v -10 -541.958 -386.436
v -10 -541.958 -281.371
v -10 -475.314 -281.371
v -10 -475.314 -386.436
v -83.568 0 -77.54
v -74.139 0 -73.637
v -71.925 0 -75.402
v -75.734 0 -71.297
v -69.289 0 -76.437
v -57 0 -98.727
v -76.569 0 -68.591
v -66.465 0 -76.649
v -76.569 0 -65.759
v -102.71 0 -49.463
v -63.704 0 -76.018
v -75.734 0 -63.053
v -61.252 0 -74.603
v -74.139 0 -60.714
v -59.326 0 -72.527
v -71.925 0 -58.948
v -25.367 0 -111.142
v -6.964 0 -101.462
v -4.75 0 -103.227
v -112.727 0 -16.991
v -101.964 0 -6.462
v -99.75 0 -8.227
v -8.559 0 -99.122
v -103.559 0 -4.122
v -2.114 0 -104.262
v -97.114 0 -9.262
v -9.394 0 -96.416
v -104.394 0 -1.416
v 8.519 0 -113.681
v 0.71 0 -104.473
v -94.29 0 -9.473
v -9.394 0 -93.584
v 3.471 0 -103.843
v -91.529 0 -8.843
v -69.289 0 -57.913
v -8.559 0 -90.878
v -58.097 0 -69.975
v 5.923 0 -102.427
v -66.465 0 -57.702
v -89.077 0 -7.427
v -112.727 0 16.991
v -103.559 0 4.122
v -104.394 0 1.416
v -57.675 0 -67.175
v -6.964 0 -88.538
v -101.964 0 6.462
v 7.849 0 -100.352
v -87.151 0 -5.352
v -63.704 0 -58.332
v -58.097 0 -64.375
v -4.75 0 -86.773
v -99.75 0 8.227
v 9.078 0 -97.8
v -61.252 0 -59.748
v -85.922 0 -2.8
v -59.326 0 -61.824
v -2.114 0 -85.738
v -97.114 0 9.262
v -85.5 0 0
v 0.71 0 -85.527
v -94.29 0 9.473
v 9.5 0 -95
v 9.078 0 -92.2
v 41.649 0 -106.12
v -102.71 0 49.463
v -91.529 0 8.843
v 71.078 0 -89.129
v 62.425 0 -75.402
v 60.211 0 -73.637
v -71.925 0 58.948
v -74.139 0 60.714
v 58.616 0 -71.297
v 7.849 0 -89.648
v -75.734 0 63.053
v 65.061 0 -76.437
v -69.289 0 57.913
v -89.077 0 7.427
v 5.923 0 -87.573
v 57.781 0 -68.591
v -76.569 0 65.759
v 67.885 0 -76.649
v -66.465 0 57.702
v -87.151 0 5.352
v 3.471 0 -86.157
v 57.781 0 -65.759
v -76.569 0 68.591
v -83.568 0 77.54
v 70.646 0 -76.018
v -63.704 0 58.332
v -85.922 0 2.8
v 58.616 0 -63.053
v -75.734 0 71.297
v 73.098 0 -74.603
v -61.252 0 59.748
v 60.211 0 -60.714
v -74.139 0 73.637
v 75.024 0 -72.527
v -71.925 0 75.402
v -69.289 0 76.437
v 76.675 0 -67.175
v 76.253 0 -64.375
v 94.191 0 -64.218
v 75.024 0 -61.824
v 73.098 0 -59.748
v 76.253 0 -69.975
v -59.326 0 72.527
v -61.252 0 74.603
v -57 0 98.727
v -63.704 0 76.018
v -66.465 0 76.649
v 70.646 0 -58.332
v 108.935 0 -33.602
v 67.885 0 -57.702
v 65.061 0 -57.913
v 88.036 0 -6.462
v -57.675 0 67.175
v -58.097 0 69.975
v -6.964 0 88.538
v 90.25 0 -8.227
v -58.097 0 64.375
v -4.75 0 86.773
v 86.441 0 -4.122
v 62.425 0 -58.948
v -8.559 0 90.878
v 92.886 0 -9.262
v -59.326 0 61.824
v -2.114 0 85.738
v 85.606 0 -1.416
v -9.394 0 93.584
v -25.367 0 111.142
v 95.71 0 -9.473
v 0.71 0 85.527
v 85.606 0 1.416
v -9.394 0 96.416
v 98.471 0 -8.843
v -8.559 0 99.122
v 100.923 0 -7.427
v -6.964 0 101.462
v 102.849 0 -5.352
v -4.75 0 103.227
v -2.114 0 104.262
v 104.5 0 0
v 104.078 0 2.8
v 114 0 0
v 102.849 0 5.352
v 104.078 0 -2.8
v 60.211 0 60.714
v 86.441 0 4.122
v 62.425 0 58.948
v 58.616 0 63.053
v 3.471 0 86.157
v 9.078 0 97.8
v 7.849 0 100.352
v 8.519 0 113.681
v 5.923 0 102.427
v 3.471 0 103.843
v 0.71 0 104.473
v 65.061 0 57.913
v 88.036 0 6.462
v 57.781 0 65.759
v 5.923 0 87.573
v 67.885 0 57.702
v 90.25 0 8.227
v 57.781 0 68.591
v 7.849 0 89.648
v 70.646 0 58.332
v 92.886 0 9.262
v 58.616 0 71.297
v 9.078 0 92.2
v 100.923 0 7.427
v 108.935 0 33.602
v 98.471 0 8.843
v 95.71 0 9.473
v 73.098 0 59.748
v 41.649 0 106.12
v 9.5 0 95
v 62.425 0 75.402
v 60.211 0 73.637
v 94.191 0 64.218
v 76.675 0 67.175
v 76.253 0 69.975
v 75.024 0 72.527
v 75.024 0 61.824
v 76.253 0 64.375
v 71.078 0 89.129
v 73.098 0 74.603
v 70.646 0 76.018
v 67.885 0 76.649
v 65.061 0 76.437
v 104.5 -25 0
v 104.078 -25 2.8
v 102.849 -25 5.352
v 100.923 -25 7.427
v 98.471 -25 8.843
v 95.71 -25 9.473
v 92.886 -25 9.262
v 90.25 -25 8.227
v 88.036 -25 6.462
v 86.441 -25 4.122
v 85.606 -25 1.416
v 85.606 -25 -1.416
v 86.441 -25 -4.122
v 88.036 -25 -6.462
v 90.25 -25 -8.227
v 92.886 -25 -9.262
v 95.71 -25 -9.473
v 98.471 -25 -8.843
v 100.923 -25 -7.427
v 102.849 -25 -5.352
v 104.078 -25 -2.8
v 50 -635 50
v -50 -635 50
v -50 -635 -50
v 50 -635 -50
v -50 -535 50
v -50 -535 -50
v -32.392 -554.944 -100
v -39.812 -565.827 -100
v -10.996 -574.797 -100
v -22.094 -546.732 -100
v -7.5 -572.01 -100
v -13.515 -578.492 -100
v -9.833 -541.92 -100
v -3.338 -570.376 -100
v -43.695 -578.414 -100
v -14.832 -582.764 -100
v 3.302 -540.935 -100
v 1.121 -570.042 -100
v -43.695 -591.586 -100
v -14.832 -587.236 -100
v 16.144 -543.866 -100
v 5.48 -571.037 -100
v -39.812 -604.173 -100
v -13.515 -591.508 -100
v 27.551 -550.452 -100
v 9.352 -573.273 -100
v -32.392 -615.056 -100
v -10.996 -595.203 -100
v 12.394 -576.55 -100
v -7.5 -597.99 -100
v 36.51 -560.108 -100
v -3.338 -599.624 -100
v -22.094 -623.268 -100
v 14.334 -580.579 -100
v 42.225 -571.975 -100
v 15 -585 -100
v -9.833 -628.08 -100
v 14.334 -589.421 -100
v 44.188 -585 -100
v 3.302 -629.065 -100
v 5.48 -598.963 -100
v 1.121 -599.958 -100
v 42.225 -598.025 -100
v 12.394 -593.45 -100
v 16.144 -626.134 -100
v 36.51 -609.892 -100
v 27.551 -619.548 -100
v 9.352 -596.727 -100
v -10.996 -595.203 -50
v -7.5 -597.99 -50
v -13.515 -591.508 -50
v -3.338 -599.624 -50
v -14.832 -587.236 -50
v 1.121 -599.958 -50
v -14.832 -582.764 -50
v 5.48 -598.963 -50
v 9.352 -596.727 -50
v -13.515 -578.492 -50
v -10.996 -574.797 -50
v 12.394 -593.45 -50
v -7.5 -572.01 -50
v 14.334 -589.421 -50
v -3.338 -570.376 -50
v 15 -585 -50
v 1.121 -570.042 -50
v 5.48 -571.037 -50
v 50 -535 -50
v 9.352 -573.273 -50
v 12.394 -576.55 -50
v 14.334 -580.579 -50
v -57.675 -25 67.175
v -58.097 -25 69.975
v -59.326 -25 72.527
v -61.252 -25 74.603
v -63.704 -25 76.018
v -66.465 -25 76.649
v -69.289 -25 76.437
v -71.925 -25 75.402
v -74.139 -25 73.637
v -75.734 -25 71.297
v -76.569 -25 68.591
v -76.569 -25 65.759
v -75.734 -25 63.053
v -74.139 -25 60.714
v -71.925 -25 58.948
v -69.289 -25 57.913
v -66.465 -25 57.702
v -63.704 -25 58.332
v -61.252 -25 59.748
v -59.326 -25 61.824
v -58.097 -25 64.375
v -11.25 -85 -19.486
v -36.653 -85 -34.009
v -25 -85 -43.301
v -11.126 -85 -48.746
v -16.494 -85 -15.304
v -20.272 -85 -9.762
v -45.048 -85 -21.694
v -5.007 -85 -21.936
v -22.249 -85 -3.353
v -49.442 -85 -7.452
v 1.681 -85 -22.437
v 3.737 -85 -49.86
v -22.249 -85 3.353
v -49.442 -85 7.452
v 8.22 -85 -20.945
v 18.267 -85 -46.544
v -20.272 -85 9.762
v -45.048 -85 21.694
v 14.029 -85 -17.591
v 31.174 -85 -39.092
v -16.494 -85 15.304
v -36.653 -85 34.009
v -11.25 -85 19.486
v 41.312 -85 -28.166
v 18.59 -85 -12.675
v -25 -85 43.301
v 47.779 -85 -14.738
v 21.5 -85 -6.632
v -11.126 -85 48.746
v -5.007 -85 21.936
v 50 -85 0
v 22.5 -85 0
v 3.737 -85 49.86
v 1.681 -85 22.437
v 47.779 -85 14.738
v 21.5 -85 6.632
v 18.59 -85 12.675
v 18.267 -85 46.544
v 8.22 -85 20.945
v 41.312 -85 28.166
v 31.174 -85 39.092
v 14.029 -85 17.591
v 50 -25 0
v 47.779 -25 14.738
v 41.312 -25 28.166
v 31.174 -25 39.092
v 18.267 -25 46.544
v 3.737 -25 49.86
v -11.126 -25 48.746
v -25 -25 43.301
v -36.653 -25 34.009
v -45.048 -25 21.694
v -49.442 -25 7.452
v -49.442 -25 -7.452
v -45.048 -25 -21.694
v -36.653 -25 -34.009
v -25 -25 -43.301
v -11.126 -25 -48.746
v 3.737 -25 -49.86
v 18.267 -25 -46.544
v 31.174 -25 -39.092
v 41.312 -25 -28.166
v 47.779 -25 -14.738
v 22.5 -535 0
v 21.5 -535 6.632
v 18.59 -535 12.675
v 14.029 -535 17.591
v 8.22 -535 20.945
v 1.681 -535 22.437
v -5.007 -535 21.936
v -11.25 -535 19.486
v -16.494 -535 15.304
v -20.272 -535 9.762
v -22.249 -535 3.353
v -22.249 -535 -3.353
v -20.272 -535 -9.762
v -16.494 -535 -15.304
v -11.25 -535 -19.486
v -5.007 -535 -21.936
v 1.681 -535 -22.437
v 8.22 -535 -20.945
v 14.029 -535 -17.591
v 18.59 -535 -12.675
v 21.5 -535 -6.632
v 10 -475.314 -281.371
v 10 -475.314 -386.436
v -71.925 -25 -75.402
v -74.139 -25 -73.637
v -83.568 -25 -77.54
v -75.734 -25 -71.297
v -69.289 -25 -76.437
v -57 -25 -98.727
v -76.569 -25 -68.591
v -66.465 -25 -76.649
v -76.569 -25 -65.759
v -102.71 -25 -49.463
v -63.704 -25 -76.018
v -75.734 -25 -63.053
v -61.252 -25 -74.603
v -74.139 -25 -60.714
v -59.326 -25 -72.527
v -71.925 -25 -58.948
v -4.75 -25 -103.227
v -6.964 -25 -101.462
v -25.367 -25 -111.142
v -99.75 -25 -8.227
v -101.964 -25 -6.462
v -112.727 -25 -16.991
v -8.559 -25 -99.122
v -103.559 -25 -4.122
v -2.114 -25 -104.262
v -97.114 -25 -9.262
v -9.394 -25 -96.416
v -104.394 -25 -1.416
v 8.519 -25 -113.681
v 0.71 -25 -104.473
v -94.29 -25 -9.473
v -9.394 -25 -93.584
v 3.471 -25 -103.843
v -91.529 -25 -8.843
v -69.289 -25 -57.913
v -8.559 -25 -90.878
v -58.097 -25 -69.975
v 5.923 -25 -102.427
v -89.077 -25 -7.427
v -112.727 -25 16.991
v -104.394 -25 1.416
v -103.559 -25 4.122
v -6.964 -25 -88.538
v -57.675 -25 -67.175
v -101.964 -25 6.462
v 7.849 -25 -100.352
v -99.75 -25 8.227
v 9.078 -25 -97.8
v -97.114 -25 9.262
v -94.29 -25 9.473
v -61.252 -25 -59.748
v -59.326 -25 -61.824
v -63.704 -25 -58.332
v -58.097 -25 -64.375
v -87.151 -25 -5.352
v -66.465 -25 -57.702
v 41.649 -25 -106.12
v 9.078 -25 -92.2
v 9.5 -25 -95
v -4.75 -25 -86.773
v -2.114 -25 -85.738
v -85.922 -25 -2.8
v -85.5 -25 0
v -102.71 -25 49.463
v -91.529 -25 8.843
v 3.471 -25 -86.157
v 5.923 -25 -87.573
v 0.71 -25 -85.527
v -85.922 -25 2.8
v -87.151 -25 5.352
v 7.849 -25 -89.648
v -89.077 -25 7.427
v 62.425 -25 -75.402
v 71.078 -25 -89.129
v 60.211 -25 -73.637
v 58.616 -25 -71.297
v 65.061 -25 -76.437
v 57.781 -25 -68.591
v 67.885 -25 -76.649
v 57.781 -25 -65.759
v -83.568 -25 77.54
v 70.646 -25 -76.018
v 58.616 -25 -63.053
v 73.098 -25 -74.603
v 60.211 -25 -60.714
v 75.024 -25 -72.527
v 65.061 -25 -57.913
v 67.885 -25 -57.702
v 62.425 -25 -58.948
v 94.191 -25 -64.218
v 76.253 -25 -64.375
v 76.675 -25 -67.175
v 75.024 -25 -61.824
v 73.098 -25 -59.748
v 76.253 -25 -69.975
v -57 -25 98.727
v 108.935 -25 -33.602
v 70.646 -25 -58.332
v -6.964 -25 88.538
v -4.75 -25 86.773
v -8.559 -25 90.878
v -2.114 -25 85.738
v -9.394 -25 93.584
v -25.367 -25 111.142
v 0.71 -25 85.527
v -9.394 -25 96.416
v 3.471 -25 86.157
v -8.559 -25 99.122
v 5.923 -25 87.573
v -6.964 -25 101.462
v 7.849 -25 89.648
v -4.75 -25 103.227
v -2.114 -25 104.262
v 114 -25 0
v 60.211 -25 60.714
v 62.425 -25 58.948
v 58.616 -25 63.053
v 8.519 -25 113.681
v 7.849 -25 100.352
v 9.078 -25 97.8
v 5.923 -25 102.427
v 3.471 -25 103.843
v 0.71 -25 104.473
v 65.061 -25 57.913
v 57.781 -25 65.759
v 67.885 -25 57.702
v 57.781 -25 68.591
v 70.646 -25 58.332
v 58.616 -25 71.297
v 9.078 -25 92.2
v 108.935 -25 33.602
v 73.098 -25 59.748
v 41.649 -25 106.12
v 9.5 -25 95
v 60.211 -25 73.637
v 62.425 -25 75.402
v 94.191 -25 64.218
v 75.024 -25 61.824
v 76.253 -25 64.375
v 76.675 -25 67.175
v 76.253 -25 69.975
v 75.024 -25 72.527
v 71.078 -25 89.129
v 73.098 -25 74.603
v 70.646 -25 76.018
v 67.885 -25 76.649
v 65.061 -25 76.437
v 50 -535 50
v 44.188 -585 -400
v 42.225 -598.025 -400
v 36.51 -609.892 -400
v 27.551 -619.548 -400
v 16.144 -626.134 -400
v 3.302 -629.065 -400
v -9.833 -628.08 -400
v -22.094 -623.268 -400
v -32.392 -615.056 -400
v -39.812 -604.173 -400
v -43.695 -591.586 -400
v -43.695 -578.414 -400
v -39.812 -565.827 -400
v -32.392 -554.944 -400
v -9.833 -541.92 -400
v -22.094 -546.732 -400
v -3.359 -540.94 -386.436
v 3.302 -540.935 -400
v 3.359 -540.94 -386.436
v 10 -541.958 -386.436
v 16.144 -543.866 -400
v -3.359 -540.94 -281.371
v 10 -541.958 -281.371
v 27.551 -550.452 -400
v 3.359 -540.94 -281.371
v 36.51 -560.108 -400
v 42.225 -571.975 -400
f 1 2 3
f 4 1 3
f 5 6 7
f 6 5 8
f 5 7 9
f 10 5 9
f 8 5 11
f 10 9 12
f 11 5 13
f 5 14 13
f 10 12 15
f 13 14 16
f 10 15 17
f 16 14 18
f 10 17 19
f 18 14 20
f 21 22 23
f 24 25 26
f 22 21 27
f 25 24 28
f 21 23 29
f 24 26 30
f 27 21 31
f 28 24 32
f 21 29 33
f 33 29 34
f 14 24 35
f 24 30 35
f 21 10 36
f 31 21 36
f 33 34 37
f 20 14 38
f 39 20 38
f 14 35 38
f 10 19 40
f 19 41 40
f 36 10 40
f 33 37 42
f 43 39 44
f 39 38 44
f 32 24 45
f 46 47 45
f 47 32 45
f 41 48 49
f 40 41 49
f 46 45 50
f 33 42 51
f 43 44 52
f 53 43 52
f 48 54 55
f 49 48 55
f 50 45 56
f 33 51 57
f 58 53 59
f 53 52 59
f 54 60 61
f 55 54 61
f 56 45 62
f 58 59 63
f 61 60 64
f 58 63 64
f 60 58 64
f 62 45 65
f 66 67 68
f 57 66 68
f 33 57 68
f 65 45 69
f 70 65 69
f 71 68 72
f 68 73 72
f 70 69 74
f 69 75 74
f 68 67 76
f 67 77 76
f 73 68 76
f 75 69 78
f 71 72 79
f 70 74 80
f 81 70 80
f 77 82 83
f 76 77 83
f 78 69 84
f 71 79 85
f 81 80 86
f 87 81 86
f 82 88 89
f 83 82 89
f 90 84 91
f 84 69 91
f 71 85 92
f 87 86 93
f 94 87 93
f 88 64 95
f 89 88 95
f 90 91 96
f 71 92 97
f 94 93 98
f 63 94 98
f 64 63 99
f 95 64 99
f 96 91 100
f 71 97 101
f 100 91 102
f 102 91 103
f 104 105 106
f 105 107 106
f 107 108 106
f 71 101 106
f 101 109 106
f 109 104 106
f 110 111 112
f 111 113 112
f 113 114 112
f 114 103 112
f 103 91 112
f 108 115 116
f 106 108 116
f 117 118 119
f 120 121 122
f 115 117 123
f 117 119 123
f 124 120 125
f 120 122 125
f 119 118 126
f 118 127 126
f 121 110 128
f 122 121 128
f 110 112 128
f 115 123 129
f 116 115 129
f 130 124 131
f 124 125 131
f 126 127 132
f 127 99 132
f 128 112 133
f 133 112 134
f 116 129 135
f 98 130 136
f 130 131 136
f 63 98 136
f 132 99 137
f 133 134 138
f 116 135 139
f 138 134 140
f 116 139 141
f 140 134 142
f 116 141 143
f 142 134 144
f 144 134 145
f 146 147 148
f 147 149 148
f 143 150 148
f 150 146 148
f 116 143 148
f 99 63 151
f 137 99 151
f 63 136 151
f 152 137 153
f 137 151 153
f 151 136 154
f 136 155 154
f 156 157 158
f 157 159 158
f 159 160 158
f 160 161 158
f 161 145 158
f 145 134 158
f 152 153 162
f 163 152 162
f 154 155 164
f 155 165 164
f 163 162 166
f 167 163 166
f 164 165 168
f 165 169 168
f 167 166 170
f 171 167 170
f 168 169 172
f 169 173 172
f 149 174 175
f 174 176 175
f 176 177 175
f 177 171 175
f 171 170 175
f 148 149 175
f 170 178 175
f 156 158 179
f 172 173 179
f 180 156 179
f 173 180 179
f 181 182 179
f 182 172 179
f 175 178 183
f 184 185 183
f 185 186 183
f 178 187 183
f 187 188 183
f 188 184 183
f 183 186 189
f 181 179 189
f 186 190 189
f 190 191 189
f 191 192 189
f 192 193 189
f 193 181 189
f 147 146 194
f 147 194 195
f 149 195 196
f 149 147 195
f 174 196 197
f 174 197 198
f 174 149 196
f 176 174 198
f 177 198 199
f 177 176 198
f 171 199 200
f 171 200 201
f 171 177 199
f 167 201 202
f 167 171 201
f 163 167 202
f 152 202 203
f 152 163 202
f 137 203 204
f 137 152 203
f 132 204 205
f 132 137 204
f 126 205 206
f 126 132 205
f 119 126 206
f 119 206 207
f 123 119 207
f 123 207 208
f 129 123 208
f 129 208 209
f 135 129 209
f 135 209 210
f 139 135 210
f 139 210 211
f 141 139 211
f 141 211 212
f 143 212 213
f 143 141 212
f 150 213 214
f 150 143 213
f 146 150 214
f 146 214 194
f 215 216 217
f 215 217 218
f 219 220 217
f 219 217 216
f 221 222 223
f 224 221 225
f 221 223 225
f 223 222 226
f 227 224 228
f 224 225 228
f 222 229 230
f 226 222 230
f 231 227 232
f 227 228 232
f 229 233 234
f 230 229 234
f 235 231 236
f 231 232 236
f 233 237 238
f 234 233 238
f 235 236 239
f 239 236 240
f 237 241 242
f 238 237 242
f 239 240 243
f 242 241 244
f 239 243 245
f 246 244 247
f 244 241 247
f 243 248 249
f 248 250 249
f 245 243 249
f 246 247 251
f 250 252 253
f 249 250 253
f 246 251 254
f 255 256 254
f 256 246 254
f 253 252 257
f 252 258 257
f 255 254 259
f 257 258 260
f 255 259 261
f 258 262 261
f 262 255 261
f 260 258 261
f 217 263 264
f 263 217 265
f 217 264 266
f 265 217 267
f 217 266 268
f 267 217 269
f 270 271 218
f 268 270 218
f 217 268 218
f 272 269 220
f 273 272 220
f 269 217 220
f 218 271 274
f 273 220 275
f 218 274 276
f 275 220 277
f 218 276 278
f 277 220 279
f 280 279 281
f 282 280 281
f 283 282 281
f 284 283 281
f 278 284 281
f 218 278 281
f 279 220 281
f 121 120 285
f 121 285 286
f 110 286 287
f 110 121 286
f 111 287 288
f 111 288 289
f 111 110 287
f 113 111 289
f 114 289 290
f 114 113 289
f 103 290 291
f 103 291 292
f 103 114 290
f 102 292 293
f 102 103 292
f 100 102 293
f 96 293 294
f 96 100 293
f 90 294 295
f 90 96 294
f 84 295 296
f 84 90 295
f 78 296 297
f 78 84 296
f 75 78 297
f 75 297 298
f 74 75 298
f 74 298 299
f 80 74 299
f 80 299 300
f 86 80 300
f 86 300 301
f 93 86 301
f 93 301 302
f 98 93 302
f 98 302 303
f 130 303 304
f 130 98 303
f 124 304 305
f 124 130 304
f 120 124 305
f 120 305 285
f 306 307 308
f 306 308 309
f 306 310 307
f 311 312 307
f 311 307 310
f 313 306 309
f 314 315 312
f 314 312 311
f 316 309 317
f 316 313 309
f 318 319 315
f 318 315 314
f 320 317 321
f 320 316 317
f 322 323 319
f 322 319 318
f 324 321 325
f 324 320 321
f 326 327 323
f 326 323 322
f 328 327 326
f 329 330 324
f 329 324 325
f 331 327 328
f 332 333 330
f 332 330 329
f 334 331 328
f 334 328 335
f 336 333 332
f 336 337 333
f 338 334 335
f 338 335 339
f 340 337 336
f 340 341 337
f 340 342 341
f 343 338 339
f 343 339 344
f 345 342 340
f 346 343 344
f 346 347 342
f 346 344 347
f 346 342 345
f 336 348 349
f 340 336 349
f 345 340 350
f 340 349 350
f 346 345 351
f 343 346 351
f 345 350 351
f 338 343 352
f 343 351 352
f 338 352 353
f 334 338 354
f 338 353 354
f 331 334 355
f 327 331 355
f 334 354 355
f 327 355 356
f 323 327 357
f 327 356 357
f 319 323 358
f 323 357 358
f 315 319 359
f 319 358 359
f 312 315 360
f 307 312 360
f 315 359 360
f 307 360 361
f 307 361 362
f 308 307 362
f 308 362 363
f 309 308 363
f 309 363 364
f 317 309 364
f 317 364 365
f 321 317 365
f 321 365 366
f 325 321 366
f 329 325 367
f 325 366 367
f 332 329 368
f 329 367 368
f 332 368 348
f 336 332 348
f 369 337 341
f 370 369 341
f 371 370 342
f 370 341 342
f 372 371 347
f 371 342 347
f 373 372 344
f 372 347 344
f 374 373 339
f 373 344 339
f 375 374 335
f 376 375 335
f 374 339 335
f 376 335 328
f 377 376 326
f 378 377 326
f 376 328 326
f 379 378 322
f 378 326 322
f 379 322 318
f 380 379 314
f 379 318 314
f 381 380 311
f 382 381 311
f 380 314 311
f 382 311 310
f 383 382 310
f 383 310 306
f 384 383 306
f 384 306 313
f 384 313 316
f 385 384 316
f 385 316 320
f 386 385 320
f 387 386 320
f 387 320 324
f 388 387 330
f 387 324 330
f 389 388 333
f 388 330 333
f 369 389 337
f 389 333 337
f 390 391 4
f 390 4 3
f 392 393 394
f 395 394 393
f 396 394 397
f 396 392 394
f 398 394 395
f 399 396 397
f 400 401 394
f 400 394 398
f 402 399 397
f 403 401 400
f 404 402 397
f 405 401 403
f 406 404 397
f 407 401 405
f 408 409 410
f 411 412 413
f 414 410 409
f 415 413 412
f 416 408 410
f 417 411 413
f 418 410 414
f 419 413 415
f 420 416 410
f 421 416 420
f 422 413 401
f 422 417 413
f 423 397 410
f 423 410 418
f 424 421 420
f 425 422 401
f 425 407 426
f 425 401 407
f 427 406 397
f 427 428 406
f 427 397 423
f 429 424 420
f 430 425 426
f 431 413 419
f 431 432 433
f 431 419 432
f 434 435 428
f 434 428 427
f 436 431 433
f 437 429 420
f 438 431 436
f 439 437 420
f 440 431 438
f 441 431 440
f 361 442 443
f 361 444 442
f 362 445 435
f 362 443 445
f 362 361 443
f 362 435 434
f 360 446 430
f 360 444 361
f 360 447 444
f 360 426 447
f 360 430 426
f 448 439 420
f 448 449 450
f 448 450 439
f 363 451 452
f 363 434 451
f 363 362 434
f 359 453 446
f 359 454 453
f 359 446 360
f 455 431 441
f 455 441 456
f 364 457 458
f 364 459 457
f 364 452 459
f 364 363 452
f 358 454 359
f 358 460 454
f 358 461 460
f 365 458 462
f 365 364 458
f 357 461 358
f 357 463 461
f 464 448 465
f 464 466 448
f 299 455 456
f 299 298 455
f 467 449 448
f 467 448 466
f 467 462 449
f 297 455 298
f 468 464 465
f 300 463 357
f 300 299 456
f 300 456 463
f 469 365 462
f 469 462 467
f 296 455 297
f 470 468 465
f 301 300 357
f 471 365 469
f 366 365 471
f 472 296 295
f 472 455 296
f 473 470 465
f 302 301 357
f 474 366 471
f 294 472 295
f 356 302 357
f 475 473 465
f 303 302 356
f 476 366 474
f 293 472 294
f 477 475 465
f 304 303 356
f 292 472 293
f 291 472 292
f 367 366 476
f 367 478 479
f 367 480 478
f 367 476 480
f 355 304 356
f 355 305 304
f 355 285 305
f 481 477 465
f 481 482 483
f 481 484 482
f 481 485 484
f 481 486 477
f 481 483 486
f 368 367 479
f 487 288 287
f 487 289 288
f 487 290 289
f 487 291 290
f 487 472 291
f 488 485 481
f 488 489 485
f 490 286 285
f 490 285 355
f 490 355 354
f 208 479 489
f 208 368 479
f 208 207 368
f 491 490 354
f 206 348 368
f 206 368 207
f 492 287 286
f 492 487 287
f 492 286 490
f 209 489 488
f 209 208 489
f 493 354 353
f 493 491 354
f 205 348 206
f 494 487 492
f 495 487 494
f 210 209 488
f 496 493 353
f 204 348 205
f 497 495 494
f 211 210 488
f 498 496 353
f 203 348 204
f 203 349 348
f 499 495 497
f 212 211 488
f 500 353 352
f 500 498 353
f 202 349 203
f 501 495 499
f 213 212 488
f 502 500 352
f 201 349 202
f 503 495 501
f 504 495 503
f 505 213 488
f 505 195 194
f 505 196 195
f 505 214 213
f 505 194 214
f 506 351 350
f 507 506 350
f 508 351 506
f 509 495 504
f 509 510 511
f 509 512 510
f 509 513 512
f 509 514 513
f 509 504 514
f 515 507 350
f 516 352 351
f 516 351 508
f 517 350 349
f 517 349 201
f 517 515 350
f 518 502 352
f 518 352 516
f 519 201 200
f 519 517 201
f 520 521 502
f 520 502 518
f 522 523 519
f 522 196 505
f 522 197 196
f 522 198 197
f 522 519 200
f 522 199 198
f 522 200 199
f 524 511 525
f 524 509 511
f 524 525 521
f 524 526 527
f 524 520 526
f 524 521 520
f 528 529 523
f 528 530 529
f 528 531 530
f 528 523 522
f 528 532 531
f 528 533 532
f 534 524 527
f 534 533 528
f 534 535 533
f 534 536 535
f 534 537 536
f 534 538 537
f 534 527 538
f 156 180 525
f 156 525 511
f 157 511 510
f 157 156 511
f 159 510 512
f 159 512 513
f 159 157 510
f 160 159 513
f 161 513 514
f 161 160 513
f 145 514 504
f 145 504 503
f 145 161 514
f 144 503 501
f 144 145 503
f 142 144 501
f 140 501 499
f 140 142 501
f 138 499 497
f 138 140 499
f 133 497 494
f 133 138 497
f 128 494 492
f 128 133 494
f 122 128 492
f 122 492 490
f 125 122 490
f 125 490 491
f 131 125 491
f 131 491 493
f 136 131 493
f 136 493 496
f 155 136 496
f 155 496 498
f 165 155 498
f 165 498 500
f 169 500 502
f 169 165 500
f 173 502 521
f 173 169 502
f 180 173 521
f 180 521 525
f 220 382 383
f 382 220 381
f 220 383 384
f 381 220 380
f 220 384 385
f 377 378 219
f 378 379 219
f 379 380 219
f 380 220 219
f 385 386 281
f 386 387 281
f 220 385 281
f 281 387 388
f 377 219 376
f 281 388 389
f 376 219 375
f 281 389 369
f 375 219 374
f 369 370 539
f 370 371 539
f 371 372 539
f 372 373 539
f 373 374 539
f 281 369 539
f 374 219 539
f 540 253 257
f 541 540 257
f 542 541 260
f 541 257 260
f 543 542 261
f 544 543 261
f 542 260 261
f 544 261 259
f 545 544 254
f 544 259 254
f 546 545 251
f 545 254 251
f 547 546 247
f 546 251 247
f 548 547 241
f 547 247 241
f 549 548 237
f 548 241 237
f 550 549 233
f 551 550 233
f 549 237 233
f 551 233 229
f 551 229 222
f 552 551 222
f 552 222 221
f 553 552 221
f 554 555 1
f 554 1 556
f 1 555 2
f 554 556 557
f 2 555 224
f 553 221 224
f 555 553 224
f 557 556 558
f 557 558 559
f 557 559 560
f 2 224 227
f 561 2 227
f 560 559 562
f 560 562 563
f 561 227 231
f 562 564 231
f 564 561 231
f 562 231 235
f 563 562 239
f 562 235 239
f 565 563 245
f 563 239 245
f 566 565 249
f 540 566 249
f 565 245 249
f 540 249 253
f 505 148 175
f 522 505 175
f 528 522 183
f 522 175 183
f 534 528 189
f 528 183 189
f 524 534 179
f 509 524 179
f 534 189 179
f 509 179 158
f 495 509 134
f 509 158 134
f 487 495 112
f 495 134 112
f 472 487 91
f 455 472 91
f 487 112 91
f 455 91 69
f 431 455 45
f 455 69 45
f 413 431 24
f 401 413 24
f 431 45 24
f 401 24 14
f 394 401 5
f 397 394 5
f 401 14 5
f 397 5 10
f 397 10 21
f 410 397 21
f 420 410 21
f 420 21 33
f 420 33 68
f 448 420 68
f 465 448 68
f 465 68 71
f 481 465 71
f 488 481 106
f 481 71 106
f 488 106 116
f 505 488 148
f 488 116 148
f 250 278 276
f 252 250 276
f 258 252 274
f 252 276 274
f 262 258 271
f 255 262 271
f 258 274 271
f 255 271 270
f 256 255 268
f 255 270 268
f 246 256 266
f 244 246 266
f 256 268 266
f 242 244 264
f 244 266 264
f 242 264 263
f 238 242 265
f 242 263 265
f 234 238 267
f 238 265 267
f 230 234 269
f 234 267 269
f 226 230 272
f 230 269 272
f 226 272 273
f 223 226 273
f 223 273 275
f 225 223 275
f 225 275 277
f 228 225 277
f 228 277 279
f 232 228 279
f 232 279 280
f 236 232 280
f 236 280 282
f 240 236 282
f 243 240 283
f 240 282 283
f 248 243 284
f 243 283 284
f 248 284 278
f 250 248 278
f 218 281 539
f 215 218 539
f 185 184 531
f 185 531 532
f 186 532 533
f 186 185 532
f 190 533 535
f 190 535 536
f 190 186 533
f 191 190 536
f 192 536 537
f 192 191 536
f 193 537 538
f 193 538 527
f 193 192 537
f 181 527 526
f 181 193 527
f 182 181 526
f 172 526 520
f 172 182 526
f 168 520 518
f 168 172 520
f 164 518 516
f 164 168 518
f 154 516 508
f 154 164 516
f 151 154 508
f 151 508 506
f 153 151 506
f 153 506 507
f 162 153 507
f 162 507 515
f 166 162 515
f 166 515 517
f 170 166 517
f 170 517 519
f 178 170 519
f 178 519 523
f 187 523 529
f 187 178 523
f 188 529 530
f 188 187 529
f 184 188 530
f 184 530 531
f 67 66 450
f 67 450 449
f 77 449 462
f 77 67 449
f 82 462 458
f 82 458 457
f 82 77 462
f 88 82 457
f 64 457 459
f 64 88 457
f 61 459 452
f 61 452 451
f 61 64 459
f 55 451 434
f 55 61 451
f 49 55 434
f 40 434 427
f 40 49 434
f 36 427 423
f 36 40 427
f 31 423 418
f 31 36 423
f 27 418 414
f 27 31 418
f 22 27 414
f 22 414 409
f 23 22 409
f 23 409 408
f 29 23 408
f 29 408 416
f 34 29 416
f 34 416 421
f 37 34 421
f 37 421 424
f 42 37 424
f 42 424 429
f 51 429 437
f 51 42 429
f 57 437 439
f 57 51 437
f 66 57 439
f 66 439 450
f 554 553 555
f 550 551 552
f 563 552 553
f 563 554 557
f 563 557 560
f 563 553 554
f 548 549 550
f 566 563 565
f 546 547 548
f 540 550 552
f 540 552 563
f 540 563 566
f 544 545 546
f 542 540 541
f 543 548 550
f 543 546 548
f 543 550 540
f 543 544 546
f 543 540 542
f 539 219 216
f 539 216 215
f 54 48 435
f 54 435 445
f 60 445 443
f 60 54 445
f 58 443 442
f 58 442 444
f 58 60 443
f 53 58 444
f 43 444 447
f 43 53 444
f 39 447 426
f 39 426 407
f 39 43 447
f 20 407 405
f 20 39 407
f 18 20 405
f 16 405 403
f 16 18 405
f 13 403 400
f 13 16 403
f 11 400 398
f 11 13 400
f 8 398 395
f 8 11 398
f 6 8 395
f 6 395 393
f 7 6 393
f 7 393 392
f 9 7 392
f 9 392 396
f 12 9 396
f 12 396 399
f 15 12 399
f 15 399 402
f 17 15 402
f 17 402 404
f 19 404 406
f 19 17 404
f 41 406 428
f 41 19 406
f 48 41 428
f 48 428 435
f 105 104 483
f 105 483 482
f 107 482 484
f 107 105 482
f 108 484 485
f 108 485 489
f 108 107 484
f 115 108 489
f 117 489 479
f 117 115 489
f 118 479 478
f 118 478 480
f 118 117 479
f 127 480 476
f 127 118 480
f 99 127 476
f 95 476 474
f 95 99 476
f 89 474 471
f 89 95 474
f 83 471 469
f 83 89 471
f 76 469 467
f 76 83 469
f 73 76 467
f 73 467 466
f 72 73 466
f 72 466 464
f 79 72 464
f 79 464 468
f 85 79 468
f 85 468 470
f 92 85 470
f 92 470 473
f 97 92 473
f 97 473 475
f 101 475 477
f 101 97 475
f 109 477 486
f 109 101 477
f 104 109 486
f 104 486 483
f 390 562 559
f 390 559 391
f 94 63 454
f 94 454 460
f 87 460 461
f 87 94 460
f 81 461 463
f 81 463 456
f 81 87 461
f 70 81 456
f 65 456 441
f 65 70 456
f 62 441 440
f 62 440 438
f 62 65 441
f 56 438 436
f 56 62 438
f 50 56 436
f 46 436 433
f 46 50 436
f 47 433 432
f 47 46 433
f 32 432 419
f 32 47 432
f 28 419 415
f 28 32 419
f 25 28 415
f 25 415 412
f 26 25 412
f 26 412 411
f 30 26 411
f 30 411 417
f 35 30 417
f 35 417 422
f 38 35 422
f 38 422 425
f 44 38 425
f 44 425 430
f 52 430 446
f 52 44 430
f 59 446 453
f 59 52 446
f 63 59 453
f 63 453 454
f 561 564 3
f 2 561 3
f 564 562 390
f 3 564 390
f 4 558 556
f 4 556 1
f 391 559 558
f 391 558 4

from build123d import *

# Parameters (mm, degrees)
F0_R      = 114
F0_R_2    = 9.5
F1_DEPTH  = 25
F2_R      = 50
F3_DEPTH  = 60
F4_R      = 22.5
F5_DEPTH  = 450
F6_W      = 100
F6_H      = 100
F7_DEPTH  = 100
F8_R      = 15
F9_DEPTH  = 50
F10_R     = 44.188125
F11_DEPTH = 300
F12_W     = 74.58368
F12_H     = 105.065704
F13_DEPTH = 10


with BuildPart() as f1:
    # F0 (on Front) → F1 (new body)
    with BuildSketch(Plane.XZ):
        Circle(F0_R)
        with Locations((-67.175144, -67.175144)):
            Circle(F0_R_2, mode=Mode.SUBTRACT)
        with Locations((0, -95)):
            Circle(F0_R_2, mode=Mode.SUBTRACT)
        with Locations((67.175144, -67.175144)):
            Circle(F0_R_2, mode=Mode.SUBTRACT)
        with Locations((-95, 0)):
            Circle(F0_R_2, mode=Mode.SUBTRACT)
        with Locations((-67.175144, 67.175144)):
            Circle(F0_R_2, mode=Mode.SUBTRACT)
        with Locations((95, 0)):
            Circle(F0_R_2, mode=Mode.SUBTRACT)
        with Locations((0, 95)):
            Circle(F0_R_2, mode=Mode.SUBTRACT)
        with Locations((67.175144, 67.175144)):
            Circle(F0_R_2, mode=Mode.SUBTRACT)
    extrude(amount=F1_DEPTH)

    # F2 (on face) → F3 (join)
    with BuildSketch(Plane.XZ.offset(25)):
        Circle(F2_R)
    extrude(amount=F3_DEPTH)

    # F4 (on face) → F5 (join)
    with BuildSketch(Plane.XZ.offset(85)):
        Circle(F4_R)
    extrude(amount=F5_DEPTH)

    # F6 (on face) → F7 (join)
    with BuildSketch(Plane.XZ.offset(535)):
        Rectangle(F6_W, F6_H)
    extrude(amount=F7_DEPTH)

    # F8 (on face) → F9 (join)
    with BuildSketch(Plane(origin=(0, 0, -50), x_dir=(1, 0, 0), z_dir=(0, 0, -1))):
        with Locations((0, 585)):
            Circle(F8_R)
    extrude(amount=F9_DEPTH)

    # F10 (on face) → F11 (join)
    with BuildSketch(Plane(origin=(0, 0, -100), x_dir=(1, 0, 0), z_dir=(0, 0, -1))):
        with Locations((0, 585)):
            Circle(F10_R)
    extrude(amount=F11_DEPTH)

    # F12 (on Right) → F13 (join, symmetric)
    with BuildSketch(Plane.YZ):
        with Locations((-512.605652, -333.903551)):
            Rectangle(F12_W, F12_H)
    extrude(amount=F13_DEPTH, both=True)


solid = f1.part
